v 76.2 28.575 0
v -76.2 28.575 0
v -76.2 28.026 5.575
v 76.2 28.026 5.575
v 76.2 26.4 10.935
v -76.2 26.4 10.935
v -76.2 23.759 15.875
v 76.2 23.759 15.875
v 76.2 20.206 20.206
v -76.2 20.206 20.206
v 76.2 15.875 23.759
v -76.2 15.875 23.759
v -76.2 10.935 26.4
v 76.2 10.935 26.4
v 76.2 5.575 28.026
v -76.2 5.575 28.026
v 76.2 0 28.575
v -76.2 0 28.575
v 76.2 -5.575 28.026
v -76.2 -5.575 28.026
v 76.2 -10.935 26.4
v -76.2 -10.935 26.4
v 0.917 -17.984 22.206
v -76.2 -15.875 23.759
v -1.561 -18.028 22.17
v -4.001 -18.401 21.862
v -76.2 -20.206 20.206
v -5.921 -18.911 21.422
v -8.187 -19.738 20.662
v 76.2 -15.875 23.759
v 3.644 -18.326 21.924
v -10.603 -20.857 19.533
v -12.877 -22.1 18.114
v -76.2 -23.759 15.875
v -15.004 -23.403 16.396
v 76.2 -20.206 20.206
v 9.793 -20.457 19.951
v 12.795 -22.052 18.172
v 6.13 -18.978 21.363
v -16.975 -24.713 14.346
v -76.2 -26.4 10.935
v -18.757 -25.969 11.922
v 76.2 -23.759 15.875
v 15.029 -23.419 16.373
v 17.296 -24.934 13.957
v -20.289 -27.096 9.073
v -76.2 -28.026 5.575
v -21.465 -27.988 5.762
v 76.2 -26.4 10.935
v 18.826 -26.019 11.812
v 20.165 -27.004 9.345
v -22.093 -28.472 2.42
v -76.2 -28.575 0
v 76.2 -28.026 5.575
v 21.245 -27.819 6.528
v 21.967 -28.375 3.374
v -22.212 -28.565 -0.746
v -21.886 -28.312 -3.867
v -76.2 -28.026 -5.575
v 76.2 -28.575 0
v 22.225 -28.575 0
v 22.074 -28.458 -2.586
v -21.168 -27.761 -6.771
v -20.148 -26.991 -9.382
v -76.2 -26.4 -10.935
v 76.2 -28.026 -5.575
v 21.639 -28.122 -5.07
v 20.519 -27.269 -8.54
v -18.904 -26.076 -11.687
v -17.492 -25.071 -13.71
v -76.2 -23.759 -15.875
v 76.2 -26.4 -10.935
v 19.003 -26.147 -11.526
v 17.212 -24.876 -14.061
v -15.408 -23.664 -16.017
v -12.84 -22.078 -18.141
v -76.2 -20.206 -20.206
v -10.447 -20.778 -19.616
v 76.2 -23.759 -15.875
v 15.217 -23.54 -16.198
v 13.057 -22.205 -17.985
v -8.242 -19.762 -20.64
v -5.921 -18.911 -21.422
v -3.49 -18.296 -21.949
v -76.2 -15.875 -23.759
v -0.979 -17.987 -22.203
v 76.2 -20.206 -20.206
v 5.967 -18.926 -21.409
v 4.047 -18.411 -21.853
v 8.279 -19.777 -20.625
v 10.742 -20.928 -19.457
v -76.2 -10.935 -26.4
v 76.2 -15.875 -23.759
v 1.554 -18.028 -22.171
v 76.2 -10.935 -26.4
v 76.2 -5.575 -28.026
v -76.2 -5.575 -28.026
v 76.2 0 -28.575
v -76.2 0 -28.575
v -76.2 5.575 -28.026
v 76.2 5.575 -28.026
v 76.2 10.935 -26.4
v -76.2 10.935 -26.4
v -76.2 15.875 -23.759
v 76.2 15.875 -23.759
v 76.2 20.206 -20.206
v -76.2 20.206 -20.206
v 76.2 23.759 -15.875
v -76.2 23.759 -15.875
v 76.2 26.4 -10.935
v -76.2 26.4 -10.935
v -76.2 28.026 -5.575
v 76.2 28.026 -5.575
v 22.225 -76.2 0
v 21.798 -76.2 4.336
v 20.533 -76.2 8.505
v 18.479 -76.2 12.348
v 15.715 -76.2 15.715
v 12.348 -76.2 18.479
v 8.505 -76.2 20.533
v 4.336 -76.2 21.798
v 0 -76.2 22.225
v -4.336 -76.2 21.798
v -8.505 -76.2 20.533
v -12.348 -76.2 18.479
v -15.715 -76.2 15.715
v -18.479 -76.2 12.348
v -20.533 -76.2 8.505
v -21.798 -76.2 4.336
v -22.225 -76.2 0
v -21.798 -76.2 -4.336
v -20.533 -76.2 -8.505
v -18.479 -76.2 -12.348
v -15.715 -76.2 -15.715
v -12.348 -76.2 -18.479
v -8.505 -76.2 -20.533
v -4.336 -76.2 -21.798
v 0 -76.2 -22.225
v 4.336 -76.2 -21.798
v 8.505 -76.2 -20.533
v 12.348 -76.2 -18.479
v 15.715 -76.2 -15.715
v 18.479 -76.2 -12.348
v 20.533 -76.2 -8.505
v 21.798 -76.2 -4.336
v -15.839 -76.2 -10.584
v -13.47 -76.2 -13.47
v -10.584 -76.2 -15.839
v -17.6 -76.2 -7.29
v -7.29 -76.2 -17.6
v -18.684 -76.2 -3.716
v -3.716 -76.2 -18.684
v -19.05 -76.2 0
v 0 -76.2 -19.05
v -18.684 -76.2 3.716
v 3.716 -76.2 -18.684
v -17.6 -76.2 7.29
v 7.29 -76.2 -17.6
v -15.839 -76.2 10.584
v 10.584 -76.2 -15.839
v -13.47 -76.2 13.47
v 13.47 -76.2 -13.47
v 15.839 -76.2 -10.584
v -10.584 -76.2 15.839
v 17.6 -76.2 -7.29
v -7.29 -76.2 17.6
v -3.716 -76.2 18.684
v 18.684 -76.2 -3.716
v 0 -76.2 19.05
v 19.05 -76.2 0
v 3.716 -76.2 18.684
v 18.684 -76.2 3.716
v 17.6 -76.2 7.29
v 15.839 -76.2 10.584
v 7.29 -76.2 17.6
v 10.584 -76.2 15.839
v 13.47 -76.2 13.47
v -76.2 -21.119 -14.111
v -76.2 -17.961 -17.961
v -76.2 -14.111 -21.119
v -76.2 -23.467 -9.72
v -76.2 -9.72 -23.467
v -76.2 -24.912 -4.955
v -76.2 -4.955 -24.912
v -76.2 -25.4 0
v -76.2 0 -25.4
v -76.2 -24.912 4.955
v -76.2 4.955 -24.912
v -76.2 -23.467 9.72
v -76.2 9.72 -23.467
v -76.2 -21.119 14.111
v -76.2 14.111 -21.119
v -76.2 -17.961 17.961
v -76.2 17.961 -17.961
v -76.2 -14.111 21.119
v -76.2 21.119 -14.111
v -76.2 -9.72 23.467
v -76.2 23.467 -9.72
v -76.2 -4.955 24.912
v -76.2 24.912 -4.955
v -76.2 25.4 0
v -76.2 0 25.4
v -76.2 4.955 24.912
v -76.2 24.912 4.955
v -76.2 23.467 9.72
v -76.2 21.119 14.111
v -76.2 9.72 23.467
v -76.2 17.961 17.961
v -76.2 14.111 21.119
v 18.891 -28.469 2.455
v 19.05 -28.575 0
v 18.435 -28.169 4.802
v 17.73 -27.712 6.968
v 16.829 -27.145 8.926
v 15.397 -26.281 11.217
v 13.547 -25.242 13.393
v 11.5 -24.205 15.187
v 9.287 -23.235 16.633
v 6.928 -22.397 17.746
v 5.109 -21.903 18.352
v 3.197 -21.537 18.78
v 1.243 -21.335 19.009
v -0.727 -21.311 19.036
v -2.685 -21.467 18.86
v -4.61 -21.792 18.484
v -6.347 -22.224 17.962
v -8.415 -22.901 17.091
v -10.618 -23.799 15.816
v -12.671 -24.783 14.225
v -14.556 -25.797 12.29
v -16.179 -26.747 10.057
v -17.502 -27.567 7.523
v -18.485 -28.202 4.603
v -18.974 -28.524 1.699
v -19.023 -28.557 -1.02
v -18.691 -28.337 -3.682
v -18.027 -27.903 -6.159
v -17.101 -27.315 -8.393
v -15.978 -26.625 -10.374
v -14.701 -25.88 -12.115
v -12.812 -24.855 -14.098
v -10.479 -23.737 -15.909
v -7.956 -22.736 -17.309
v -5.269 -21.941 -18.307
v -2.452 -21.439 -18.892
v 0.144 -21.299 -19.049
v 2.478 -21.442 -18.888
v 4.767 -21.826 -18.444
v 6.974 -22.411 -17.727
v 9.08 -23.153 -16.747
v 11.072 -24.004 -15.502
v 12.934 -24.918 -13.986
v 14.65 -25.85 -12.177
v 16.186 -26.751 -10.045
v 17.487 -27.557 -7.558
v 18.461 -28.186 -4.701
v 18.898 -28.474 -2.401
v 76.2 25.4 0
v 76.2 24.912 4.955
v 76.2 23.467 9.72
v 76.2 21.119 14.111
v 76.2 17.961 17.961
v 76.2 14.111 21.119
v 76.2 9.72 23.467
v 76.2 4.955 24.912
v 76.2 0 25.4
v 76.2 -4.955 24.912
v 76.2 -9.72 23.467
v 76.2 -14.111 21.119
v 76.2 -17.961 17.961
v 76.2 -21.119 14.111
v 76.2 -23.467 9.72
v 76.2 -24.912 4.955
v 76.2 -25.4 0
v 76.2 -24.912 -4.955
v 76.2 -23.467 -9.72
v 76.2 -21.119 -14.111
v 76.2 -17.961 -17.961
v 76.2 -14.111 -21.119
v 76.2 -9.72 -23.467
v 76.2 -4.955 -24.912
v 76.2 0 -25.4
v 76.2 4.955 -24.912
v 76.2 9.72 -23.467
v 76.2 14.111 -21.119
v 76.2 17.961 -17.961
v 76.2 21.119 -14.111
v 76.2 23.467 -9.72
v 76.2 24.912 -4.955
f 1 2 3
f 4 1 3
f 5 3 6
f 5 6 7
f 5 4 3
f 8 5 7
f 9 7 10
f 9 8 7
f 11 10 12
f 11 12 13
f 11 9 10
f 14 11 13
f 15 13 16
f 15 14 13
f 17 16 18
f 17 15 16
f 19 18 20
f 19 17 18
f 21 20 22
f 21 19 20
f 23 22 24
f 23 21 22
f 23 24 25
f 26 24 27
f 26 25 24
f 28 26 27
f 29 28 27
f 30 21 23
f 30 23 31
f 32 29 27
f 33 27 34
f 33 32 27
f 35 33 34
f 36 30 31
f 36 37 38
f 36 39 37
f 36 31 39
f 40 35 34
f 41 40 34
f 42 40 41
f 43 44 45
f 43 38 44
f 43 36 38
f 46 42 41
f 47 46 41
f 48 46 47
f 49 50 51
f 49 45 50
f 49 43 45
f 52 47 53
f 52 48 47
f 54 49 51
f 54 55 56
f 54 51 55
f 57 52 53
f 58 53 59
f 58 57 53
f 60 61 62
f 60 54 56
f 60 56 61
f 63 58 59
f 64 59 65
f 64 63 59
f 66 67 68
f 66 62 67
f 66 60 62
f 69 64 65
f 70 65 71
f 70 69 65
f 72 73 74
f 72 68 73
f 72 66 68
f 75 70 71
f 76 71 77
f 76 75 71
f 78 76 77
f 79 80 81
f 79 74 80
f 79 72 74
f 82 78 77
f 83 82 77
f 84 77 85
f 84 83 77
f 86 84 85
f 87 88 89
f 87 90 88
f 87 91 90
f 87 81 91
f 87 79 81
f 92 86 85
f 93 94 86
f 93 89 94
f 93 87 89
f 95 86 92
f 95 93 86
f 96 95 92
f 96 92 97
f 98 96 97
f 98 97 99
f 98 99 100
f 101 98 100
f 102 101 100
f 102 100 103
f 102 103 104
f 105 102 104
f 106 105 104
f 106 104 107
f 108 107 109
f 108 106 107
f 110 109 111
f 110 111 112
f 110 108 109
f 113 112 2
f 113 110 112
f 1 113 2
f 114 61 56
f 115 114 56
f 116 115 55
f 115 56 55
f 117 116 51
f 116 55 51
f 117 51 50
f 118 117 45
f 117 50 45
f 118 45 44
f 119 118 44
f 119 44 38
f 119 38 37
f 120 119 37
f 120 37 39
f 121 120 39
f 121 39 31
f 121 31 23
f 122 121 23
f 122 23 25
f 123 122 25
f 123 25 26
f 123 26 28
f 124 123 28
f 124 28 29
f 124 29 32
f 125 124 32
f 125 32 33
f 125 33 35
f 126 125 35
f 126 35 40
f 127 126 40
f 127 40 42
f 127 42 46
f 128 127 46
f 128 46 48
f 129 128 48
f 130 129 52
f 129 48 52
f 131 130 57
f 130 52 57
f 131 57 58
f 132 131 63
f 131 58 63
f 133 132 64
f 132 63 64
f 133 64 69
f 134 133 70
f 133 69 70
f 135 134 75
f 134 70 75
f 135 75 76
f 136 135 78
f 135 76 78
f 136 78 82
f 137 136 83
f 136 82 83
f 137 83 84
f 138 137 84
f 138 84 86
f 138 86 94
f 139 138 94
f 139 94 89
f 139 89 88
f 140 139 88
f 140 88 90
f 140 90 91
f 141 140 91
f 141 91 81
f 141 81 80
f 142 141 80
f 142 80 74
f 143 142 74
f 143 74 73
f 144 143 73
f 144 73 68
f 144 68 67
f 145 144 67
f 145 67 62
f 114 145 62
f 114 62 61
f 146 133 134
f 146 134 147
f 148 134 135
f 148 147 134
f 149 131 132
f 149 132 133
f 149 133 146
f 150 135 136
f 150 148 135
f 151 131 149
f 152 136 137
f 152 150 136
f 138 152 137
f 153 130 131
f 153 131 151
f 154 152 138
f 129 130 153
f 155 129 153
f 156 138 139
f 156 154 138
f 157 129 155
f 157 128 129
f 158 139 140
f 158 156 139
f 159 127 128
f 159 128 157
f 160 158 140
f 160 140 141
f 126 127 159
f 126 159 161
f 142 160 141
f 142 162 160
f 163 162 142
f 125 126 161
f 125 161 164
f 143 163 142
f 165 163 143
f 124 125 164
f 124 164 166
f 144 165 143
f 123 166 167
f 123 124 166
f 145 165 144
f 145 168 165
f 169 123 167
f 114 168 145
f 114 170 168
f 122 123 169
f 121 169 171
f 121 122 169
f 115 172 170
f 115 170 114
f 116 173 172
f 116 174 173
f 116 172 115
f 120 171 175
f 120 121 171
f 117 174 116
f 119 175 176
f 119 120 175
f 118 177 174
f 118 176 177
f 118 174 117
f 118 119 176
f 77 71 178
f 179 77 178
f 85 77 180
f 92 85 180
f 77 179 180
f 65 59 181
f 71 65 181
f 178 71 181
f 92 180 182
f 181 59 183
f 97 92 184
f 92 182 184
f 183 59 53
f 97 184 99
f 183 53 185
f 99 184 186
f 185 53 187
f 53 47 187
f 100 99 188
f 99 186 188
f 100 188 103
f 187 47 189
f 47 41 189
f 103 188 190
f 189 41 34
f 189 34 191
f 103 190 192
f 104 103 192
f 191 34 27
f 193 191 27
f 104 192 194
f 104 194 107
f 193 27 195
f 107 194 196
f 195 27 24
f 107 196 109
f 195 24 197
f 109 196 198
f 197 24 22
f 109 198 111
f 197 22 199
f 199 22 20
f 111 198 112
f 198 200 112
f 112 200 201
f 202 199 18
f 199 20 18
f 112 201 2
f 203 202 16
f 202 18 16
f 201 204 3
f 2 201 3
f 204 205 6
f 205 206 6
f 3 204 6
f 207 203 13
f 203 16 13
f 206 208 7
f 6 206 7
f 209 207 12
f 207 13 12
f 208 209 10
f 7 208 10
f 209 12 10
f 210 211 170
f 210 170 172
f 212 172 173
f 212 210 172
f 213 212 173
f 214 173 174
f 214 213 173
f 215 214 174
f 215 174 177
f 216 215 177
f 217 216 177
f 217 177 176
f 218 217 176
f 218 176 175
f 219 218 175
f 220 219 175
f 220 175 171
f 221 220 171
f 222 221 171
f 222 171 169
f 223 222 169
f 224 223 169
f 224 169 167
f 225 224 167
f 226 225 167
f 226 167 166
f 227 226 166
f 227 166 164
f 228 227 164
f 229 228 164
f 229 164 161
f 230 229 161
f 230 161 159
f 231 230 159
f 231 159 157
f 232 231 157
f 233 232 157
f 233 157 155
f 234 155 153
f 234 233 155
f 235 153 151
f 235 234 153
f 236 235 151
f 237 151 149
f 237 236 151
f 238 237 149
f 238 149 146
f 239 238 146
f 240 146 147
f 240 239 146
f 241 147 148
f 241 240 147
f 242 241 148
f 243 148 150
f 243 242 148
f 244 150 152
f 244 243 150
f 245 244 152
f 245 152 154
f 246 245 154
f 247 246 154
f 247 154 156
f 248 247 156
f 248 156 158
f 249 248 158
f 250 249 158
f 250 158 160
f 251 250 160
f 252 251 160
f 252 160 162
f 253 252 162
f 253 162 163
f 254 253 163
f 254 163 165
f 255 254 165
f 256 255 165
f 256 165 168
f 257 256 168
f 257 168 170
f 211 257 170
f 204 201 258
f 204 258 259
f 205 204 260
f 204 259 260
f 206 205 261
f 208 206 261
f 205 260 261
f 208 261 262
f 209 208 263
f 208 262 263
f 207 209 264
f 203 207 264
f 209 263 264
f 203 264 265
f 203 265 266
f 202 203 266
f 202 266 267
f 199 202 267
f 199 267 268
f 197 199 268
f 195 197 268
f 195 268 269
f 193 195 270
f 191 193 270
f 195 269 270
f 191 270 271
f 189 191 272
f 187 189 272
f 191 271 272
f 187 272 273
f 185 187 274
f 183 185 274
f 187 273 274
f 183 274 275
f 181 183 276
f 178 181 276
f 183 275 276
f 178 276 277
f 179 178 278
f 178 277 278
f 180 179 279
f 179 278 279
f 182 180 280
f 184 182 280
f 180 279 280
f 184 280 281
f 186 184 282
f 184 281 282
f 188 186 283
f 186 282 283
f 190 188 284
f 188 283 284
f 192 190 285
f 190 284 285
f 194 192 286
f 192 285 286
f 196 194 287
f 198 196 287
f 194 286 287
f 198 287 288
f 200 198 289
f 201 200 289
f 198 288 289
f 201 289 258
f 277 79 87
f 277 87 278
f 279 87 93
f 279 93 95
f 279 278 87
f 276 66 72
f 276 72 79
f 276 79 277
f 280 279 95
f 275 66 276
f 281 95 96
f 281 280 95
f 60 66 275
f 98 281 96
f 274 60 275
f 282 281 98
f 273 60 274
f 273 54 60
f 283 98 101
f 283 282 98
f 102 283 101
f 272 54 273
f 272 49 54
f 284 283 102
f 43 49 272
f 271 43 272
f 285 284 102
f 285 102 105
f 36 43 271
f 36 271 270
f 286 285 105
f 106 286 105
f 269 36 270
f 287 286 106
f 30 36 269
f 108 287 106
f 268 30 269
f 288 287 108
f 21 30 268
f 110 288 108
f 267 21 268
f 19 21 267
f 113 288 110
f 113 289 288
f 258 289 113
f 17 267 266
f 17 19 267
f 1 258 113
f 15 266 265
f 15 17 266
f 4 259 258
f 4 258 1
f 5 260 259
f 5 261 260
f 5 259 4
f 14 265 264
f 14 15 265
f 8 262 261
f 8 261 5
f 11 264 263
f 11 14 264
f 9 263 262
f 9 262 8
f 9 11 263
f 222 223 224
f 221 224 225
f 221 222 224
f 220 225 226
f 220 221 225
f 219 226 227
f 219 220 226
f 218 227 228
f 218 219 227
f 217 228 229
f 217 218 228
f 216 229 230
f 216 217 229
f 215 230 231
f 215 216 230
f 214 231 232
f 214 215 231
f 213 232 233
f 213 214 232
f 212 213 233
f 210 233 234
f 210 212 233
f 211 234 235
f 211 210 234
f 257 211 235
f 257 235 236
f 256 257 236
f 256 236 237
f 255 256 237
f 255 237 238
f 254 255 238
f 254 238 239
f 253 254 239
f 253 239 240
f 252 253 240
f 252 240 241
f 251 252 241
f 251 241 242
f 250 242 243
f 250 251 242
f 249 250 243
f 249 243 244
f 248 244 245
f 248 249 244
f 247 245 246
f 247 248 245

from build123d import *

# Parameters (mm, degrees)
F0_R          = 28.575
F1_DEPTH      = 76.2
F1_DEPTH_BACK = 76.2
F2_R          = 22.225
F2_R_2        = 19.05
F3_DEPTH      = 76.2
F4_R          = 25.4
F5_DEPTH      = 152.4


with BuildPart() as f1:
    # F0 (on Right) → F1 (new body, two sides)
    with BuildSketch(Plane.YZ) as f1_sk:
        Circle(F0_R)
    extrude(amount=F1_DEPTH)
    extrude(f1_sk.sketch, amount=-F1_DEPTH_BACK)

    # F2 (on Front) → F3 (join)
    with BuildSketch(Plane.XZ):
        Circle(F2_R)
        Circle(F2_R_2, mode=Mode.SUBTRACT)
    extrude(amount=F3_DEPTH)

    # F4 (on face) → F5 (cut)
    with BuildSketch(Plane.YZ.offset(76.2)):
        Circle(F4_R)
    extrude(amount=-F5_DEPTH, mode=Mode.SUBTRACT)


solid = f1.part
